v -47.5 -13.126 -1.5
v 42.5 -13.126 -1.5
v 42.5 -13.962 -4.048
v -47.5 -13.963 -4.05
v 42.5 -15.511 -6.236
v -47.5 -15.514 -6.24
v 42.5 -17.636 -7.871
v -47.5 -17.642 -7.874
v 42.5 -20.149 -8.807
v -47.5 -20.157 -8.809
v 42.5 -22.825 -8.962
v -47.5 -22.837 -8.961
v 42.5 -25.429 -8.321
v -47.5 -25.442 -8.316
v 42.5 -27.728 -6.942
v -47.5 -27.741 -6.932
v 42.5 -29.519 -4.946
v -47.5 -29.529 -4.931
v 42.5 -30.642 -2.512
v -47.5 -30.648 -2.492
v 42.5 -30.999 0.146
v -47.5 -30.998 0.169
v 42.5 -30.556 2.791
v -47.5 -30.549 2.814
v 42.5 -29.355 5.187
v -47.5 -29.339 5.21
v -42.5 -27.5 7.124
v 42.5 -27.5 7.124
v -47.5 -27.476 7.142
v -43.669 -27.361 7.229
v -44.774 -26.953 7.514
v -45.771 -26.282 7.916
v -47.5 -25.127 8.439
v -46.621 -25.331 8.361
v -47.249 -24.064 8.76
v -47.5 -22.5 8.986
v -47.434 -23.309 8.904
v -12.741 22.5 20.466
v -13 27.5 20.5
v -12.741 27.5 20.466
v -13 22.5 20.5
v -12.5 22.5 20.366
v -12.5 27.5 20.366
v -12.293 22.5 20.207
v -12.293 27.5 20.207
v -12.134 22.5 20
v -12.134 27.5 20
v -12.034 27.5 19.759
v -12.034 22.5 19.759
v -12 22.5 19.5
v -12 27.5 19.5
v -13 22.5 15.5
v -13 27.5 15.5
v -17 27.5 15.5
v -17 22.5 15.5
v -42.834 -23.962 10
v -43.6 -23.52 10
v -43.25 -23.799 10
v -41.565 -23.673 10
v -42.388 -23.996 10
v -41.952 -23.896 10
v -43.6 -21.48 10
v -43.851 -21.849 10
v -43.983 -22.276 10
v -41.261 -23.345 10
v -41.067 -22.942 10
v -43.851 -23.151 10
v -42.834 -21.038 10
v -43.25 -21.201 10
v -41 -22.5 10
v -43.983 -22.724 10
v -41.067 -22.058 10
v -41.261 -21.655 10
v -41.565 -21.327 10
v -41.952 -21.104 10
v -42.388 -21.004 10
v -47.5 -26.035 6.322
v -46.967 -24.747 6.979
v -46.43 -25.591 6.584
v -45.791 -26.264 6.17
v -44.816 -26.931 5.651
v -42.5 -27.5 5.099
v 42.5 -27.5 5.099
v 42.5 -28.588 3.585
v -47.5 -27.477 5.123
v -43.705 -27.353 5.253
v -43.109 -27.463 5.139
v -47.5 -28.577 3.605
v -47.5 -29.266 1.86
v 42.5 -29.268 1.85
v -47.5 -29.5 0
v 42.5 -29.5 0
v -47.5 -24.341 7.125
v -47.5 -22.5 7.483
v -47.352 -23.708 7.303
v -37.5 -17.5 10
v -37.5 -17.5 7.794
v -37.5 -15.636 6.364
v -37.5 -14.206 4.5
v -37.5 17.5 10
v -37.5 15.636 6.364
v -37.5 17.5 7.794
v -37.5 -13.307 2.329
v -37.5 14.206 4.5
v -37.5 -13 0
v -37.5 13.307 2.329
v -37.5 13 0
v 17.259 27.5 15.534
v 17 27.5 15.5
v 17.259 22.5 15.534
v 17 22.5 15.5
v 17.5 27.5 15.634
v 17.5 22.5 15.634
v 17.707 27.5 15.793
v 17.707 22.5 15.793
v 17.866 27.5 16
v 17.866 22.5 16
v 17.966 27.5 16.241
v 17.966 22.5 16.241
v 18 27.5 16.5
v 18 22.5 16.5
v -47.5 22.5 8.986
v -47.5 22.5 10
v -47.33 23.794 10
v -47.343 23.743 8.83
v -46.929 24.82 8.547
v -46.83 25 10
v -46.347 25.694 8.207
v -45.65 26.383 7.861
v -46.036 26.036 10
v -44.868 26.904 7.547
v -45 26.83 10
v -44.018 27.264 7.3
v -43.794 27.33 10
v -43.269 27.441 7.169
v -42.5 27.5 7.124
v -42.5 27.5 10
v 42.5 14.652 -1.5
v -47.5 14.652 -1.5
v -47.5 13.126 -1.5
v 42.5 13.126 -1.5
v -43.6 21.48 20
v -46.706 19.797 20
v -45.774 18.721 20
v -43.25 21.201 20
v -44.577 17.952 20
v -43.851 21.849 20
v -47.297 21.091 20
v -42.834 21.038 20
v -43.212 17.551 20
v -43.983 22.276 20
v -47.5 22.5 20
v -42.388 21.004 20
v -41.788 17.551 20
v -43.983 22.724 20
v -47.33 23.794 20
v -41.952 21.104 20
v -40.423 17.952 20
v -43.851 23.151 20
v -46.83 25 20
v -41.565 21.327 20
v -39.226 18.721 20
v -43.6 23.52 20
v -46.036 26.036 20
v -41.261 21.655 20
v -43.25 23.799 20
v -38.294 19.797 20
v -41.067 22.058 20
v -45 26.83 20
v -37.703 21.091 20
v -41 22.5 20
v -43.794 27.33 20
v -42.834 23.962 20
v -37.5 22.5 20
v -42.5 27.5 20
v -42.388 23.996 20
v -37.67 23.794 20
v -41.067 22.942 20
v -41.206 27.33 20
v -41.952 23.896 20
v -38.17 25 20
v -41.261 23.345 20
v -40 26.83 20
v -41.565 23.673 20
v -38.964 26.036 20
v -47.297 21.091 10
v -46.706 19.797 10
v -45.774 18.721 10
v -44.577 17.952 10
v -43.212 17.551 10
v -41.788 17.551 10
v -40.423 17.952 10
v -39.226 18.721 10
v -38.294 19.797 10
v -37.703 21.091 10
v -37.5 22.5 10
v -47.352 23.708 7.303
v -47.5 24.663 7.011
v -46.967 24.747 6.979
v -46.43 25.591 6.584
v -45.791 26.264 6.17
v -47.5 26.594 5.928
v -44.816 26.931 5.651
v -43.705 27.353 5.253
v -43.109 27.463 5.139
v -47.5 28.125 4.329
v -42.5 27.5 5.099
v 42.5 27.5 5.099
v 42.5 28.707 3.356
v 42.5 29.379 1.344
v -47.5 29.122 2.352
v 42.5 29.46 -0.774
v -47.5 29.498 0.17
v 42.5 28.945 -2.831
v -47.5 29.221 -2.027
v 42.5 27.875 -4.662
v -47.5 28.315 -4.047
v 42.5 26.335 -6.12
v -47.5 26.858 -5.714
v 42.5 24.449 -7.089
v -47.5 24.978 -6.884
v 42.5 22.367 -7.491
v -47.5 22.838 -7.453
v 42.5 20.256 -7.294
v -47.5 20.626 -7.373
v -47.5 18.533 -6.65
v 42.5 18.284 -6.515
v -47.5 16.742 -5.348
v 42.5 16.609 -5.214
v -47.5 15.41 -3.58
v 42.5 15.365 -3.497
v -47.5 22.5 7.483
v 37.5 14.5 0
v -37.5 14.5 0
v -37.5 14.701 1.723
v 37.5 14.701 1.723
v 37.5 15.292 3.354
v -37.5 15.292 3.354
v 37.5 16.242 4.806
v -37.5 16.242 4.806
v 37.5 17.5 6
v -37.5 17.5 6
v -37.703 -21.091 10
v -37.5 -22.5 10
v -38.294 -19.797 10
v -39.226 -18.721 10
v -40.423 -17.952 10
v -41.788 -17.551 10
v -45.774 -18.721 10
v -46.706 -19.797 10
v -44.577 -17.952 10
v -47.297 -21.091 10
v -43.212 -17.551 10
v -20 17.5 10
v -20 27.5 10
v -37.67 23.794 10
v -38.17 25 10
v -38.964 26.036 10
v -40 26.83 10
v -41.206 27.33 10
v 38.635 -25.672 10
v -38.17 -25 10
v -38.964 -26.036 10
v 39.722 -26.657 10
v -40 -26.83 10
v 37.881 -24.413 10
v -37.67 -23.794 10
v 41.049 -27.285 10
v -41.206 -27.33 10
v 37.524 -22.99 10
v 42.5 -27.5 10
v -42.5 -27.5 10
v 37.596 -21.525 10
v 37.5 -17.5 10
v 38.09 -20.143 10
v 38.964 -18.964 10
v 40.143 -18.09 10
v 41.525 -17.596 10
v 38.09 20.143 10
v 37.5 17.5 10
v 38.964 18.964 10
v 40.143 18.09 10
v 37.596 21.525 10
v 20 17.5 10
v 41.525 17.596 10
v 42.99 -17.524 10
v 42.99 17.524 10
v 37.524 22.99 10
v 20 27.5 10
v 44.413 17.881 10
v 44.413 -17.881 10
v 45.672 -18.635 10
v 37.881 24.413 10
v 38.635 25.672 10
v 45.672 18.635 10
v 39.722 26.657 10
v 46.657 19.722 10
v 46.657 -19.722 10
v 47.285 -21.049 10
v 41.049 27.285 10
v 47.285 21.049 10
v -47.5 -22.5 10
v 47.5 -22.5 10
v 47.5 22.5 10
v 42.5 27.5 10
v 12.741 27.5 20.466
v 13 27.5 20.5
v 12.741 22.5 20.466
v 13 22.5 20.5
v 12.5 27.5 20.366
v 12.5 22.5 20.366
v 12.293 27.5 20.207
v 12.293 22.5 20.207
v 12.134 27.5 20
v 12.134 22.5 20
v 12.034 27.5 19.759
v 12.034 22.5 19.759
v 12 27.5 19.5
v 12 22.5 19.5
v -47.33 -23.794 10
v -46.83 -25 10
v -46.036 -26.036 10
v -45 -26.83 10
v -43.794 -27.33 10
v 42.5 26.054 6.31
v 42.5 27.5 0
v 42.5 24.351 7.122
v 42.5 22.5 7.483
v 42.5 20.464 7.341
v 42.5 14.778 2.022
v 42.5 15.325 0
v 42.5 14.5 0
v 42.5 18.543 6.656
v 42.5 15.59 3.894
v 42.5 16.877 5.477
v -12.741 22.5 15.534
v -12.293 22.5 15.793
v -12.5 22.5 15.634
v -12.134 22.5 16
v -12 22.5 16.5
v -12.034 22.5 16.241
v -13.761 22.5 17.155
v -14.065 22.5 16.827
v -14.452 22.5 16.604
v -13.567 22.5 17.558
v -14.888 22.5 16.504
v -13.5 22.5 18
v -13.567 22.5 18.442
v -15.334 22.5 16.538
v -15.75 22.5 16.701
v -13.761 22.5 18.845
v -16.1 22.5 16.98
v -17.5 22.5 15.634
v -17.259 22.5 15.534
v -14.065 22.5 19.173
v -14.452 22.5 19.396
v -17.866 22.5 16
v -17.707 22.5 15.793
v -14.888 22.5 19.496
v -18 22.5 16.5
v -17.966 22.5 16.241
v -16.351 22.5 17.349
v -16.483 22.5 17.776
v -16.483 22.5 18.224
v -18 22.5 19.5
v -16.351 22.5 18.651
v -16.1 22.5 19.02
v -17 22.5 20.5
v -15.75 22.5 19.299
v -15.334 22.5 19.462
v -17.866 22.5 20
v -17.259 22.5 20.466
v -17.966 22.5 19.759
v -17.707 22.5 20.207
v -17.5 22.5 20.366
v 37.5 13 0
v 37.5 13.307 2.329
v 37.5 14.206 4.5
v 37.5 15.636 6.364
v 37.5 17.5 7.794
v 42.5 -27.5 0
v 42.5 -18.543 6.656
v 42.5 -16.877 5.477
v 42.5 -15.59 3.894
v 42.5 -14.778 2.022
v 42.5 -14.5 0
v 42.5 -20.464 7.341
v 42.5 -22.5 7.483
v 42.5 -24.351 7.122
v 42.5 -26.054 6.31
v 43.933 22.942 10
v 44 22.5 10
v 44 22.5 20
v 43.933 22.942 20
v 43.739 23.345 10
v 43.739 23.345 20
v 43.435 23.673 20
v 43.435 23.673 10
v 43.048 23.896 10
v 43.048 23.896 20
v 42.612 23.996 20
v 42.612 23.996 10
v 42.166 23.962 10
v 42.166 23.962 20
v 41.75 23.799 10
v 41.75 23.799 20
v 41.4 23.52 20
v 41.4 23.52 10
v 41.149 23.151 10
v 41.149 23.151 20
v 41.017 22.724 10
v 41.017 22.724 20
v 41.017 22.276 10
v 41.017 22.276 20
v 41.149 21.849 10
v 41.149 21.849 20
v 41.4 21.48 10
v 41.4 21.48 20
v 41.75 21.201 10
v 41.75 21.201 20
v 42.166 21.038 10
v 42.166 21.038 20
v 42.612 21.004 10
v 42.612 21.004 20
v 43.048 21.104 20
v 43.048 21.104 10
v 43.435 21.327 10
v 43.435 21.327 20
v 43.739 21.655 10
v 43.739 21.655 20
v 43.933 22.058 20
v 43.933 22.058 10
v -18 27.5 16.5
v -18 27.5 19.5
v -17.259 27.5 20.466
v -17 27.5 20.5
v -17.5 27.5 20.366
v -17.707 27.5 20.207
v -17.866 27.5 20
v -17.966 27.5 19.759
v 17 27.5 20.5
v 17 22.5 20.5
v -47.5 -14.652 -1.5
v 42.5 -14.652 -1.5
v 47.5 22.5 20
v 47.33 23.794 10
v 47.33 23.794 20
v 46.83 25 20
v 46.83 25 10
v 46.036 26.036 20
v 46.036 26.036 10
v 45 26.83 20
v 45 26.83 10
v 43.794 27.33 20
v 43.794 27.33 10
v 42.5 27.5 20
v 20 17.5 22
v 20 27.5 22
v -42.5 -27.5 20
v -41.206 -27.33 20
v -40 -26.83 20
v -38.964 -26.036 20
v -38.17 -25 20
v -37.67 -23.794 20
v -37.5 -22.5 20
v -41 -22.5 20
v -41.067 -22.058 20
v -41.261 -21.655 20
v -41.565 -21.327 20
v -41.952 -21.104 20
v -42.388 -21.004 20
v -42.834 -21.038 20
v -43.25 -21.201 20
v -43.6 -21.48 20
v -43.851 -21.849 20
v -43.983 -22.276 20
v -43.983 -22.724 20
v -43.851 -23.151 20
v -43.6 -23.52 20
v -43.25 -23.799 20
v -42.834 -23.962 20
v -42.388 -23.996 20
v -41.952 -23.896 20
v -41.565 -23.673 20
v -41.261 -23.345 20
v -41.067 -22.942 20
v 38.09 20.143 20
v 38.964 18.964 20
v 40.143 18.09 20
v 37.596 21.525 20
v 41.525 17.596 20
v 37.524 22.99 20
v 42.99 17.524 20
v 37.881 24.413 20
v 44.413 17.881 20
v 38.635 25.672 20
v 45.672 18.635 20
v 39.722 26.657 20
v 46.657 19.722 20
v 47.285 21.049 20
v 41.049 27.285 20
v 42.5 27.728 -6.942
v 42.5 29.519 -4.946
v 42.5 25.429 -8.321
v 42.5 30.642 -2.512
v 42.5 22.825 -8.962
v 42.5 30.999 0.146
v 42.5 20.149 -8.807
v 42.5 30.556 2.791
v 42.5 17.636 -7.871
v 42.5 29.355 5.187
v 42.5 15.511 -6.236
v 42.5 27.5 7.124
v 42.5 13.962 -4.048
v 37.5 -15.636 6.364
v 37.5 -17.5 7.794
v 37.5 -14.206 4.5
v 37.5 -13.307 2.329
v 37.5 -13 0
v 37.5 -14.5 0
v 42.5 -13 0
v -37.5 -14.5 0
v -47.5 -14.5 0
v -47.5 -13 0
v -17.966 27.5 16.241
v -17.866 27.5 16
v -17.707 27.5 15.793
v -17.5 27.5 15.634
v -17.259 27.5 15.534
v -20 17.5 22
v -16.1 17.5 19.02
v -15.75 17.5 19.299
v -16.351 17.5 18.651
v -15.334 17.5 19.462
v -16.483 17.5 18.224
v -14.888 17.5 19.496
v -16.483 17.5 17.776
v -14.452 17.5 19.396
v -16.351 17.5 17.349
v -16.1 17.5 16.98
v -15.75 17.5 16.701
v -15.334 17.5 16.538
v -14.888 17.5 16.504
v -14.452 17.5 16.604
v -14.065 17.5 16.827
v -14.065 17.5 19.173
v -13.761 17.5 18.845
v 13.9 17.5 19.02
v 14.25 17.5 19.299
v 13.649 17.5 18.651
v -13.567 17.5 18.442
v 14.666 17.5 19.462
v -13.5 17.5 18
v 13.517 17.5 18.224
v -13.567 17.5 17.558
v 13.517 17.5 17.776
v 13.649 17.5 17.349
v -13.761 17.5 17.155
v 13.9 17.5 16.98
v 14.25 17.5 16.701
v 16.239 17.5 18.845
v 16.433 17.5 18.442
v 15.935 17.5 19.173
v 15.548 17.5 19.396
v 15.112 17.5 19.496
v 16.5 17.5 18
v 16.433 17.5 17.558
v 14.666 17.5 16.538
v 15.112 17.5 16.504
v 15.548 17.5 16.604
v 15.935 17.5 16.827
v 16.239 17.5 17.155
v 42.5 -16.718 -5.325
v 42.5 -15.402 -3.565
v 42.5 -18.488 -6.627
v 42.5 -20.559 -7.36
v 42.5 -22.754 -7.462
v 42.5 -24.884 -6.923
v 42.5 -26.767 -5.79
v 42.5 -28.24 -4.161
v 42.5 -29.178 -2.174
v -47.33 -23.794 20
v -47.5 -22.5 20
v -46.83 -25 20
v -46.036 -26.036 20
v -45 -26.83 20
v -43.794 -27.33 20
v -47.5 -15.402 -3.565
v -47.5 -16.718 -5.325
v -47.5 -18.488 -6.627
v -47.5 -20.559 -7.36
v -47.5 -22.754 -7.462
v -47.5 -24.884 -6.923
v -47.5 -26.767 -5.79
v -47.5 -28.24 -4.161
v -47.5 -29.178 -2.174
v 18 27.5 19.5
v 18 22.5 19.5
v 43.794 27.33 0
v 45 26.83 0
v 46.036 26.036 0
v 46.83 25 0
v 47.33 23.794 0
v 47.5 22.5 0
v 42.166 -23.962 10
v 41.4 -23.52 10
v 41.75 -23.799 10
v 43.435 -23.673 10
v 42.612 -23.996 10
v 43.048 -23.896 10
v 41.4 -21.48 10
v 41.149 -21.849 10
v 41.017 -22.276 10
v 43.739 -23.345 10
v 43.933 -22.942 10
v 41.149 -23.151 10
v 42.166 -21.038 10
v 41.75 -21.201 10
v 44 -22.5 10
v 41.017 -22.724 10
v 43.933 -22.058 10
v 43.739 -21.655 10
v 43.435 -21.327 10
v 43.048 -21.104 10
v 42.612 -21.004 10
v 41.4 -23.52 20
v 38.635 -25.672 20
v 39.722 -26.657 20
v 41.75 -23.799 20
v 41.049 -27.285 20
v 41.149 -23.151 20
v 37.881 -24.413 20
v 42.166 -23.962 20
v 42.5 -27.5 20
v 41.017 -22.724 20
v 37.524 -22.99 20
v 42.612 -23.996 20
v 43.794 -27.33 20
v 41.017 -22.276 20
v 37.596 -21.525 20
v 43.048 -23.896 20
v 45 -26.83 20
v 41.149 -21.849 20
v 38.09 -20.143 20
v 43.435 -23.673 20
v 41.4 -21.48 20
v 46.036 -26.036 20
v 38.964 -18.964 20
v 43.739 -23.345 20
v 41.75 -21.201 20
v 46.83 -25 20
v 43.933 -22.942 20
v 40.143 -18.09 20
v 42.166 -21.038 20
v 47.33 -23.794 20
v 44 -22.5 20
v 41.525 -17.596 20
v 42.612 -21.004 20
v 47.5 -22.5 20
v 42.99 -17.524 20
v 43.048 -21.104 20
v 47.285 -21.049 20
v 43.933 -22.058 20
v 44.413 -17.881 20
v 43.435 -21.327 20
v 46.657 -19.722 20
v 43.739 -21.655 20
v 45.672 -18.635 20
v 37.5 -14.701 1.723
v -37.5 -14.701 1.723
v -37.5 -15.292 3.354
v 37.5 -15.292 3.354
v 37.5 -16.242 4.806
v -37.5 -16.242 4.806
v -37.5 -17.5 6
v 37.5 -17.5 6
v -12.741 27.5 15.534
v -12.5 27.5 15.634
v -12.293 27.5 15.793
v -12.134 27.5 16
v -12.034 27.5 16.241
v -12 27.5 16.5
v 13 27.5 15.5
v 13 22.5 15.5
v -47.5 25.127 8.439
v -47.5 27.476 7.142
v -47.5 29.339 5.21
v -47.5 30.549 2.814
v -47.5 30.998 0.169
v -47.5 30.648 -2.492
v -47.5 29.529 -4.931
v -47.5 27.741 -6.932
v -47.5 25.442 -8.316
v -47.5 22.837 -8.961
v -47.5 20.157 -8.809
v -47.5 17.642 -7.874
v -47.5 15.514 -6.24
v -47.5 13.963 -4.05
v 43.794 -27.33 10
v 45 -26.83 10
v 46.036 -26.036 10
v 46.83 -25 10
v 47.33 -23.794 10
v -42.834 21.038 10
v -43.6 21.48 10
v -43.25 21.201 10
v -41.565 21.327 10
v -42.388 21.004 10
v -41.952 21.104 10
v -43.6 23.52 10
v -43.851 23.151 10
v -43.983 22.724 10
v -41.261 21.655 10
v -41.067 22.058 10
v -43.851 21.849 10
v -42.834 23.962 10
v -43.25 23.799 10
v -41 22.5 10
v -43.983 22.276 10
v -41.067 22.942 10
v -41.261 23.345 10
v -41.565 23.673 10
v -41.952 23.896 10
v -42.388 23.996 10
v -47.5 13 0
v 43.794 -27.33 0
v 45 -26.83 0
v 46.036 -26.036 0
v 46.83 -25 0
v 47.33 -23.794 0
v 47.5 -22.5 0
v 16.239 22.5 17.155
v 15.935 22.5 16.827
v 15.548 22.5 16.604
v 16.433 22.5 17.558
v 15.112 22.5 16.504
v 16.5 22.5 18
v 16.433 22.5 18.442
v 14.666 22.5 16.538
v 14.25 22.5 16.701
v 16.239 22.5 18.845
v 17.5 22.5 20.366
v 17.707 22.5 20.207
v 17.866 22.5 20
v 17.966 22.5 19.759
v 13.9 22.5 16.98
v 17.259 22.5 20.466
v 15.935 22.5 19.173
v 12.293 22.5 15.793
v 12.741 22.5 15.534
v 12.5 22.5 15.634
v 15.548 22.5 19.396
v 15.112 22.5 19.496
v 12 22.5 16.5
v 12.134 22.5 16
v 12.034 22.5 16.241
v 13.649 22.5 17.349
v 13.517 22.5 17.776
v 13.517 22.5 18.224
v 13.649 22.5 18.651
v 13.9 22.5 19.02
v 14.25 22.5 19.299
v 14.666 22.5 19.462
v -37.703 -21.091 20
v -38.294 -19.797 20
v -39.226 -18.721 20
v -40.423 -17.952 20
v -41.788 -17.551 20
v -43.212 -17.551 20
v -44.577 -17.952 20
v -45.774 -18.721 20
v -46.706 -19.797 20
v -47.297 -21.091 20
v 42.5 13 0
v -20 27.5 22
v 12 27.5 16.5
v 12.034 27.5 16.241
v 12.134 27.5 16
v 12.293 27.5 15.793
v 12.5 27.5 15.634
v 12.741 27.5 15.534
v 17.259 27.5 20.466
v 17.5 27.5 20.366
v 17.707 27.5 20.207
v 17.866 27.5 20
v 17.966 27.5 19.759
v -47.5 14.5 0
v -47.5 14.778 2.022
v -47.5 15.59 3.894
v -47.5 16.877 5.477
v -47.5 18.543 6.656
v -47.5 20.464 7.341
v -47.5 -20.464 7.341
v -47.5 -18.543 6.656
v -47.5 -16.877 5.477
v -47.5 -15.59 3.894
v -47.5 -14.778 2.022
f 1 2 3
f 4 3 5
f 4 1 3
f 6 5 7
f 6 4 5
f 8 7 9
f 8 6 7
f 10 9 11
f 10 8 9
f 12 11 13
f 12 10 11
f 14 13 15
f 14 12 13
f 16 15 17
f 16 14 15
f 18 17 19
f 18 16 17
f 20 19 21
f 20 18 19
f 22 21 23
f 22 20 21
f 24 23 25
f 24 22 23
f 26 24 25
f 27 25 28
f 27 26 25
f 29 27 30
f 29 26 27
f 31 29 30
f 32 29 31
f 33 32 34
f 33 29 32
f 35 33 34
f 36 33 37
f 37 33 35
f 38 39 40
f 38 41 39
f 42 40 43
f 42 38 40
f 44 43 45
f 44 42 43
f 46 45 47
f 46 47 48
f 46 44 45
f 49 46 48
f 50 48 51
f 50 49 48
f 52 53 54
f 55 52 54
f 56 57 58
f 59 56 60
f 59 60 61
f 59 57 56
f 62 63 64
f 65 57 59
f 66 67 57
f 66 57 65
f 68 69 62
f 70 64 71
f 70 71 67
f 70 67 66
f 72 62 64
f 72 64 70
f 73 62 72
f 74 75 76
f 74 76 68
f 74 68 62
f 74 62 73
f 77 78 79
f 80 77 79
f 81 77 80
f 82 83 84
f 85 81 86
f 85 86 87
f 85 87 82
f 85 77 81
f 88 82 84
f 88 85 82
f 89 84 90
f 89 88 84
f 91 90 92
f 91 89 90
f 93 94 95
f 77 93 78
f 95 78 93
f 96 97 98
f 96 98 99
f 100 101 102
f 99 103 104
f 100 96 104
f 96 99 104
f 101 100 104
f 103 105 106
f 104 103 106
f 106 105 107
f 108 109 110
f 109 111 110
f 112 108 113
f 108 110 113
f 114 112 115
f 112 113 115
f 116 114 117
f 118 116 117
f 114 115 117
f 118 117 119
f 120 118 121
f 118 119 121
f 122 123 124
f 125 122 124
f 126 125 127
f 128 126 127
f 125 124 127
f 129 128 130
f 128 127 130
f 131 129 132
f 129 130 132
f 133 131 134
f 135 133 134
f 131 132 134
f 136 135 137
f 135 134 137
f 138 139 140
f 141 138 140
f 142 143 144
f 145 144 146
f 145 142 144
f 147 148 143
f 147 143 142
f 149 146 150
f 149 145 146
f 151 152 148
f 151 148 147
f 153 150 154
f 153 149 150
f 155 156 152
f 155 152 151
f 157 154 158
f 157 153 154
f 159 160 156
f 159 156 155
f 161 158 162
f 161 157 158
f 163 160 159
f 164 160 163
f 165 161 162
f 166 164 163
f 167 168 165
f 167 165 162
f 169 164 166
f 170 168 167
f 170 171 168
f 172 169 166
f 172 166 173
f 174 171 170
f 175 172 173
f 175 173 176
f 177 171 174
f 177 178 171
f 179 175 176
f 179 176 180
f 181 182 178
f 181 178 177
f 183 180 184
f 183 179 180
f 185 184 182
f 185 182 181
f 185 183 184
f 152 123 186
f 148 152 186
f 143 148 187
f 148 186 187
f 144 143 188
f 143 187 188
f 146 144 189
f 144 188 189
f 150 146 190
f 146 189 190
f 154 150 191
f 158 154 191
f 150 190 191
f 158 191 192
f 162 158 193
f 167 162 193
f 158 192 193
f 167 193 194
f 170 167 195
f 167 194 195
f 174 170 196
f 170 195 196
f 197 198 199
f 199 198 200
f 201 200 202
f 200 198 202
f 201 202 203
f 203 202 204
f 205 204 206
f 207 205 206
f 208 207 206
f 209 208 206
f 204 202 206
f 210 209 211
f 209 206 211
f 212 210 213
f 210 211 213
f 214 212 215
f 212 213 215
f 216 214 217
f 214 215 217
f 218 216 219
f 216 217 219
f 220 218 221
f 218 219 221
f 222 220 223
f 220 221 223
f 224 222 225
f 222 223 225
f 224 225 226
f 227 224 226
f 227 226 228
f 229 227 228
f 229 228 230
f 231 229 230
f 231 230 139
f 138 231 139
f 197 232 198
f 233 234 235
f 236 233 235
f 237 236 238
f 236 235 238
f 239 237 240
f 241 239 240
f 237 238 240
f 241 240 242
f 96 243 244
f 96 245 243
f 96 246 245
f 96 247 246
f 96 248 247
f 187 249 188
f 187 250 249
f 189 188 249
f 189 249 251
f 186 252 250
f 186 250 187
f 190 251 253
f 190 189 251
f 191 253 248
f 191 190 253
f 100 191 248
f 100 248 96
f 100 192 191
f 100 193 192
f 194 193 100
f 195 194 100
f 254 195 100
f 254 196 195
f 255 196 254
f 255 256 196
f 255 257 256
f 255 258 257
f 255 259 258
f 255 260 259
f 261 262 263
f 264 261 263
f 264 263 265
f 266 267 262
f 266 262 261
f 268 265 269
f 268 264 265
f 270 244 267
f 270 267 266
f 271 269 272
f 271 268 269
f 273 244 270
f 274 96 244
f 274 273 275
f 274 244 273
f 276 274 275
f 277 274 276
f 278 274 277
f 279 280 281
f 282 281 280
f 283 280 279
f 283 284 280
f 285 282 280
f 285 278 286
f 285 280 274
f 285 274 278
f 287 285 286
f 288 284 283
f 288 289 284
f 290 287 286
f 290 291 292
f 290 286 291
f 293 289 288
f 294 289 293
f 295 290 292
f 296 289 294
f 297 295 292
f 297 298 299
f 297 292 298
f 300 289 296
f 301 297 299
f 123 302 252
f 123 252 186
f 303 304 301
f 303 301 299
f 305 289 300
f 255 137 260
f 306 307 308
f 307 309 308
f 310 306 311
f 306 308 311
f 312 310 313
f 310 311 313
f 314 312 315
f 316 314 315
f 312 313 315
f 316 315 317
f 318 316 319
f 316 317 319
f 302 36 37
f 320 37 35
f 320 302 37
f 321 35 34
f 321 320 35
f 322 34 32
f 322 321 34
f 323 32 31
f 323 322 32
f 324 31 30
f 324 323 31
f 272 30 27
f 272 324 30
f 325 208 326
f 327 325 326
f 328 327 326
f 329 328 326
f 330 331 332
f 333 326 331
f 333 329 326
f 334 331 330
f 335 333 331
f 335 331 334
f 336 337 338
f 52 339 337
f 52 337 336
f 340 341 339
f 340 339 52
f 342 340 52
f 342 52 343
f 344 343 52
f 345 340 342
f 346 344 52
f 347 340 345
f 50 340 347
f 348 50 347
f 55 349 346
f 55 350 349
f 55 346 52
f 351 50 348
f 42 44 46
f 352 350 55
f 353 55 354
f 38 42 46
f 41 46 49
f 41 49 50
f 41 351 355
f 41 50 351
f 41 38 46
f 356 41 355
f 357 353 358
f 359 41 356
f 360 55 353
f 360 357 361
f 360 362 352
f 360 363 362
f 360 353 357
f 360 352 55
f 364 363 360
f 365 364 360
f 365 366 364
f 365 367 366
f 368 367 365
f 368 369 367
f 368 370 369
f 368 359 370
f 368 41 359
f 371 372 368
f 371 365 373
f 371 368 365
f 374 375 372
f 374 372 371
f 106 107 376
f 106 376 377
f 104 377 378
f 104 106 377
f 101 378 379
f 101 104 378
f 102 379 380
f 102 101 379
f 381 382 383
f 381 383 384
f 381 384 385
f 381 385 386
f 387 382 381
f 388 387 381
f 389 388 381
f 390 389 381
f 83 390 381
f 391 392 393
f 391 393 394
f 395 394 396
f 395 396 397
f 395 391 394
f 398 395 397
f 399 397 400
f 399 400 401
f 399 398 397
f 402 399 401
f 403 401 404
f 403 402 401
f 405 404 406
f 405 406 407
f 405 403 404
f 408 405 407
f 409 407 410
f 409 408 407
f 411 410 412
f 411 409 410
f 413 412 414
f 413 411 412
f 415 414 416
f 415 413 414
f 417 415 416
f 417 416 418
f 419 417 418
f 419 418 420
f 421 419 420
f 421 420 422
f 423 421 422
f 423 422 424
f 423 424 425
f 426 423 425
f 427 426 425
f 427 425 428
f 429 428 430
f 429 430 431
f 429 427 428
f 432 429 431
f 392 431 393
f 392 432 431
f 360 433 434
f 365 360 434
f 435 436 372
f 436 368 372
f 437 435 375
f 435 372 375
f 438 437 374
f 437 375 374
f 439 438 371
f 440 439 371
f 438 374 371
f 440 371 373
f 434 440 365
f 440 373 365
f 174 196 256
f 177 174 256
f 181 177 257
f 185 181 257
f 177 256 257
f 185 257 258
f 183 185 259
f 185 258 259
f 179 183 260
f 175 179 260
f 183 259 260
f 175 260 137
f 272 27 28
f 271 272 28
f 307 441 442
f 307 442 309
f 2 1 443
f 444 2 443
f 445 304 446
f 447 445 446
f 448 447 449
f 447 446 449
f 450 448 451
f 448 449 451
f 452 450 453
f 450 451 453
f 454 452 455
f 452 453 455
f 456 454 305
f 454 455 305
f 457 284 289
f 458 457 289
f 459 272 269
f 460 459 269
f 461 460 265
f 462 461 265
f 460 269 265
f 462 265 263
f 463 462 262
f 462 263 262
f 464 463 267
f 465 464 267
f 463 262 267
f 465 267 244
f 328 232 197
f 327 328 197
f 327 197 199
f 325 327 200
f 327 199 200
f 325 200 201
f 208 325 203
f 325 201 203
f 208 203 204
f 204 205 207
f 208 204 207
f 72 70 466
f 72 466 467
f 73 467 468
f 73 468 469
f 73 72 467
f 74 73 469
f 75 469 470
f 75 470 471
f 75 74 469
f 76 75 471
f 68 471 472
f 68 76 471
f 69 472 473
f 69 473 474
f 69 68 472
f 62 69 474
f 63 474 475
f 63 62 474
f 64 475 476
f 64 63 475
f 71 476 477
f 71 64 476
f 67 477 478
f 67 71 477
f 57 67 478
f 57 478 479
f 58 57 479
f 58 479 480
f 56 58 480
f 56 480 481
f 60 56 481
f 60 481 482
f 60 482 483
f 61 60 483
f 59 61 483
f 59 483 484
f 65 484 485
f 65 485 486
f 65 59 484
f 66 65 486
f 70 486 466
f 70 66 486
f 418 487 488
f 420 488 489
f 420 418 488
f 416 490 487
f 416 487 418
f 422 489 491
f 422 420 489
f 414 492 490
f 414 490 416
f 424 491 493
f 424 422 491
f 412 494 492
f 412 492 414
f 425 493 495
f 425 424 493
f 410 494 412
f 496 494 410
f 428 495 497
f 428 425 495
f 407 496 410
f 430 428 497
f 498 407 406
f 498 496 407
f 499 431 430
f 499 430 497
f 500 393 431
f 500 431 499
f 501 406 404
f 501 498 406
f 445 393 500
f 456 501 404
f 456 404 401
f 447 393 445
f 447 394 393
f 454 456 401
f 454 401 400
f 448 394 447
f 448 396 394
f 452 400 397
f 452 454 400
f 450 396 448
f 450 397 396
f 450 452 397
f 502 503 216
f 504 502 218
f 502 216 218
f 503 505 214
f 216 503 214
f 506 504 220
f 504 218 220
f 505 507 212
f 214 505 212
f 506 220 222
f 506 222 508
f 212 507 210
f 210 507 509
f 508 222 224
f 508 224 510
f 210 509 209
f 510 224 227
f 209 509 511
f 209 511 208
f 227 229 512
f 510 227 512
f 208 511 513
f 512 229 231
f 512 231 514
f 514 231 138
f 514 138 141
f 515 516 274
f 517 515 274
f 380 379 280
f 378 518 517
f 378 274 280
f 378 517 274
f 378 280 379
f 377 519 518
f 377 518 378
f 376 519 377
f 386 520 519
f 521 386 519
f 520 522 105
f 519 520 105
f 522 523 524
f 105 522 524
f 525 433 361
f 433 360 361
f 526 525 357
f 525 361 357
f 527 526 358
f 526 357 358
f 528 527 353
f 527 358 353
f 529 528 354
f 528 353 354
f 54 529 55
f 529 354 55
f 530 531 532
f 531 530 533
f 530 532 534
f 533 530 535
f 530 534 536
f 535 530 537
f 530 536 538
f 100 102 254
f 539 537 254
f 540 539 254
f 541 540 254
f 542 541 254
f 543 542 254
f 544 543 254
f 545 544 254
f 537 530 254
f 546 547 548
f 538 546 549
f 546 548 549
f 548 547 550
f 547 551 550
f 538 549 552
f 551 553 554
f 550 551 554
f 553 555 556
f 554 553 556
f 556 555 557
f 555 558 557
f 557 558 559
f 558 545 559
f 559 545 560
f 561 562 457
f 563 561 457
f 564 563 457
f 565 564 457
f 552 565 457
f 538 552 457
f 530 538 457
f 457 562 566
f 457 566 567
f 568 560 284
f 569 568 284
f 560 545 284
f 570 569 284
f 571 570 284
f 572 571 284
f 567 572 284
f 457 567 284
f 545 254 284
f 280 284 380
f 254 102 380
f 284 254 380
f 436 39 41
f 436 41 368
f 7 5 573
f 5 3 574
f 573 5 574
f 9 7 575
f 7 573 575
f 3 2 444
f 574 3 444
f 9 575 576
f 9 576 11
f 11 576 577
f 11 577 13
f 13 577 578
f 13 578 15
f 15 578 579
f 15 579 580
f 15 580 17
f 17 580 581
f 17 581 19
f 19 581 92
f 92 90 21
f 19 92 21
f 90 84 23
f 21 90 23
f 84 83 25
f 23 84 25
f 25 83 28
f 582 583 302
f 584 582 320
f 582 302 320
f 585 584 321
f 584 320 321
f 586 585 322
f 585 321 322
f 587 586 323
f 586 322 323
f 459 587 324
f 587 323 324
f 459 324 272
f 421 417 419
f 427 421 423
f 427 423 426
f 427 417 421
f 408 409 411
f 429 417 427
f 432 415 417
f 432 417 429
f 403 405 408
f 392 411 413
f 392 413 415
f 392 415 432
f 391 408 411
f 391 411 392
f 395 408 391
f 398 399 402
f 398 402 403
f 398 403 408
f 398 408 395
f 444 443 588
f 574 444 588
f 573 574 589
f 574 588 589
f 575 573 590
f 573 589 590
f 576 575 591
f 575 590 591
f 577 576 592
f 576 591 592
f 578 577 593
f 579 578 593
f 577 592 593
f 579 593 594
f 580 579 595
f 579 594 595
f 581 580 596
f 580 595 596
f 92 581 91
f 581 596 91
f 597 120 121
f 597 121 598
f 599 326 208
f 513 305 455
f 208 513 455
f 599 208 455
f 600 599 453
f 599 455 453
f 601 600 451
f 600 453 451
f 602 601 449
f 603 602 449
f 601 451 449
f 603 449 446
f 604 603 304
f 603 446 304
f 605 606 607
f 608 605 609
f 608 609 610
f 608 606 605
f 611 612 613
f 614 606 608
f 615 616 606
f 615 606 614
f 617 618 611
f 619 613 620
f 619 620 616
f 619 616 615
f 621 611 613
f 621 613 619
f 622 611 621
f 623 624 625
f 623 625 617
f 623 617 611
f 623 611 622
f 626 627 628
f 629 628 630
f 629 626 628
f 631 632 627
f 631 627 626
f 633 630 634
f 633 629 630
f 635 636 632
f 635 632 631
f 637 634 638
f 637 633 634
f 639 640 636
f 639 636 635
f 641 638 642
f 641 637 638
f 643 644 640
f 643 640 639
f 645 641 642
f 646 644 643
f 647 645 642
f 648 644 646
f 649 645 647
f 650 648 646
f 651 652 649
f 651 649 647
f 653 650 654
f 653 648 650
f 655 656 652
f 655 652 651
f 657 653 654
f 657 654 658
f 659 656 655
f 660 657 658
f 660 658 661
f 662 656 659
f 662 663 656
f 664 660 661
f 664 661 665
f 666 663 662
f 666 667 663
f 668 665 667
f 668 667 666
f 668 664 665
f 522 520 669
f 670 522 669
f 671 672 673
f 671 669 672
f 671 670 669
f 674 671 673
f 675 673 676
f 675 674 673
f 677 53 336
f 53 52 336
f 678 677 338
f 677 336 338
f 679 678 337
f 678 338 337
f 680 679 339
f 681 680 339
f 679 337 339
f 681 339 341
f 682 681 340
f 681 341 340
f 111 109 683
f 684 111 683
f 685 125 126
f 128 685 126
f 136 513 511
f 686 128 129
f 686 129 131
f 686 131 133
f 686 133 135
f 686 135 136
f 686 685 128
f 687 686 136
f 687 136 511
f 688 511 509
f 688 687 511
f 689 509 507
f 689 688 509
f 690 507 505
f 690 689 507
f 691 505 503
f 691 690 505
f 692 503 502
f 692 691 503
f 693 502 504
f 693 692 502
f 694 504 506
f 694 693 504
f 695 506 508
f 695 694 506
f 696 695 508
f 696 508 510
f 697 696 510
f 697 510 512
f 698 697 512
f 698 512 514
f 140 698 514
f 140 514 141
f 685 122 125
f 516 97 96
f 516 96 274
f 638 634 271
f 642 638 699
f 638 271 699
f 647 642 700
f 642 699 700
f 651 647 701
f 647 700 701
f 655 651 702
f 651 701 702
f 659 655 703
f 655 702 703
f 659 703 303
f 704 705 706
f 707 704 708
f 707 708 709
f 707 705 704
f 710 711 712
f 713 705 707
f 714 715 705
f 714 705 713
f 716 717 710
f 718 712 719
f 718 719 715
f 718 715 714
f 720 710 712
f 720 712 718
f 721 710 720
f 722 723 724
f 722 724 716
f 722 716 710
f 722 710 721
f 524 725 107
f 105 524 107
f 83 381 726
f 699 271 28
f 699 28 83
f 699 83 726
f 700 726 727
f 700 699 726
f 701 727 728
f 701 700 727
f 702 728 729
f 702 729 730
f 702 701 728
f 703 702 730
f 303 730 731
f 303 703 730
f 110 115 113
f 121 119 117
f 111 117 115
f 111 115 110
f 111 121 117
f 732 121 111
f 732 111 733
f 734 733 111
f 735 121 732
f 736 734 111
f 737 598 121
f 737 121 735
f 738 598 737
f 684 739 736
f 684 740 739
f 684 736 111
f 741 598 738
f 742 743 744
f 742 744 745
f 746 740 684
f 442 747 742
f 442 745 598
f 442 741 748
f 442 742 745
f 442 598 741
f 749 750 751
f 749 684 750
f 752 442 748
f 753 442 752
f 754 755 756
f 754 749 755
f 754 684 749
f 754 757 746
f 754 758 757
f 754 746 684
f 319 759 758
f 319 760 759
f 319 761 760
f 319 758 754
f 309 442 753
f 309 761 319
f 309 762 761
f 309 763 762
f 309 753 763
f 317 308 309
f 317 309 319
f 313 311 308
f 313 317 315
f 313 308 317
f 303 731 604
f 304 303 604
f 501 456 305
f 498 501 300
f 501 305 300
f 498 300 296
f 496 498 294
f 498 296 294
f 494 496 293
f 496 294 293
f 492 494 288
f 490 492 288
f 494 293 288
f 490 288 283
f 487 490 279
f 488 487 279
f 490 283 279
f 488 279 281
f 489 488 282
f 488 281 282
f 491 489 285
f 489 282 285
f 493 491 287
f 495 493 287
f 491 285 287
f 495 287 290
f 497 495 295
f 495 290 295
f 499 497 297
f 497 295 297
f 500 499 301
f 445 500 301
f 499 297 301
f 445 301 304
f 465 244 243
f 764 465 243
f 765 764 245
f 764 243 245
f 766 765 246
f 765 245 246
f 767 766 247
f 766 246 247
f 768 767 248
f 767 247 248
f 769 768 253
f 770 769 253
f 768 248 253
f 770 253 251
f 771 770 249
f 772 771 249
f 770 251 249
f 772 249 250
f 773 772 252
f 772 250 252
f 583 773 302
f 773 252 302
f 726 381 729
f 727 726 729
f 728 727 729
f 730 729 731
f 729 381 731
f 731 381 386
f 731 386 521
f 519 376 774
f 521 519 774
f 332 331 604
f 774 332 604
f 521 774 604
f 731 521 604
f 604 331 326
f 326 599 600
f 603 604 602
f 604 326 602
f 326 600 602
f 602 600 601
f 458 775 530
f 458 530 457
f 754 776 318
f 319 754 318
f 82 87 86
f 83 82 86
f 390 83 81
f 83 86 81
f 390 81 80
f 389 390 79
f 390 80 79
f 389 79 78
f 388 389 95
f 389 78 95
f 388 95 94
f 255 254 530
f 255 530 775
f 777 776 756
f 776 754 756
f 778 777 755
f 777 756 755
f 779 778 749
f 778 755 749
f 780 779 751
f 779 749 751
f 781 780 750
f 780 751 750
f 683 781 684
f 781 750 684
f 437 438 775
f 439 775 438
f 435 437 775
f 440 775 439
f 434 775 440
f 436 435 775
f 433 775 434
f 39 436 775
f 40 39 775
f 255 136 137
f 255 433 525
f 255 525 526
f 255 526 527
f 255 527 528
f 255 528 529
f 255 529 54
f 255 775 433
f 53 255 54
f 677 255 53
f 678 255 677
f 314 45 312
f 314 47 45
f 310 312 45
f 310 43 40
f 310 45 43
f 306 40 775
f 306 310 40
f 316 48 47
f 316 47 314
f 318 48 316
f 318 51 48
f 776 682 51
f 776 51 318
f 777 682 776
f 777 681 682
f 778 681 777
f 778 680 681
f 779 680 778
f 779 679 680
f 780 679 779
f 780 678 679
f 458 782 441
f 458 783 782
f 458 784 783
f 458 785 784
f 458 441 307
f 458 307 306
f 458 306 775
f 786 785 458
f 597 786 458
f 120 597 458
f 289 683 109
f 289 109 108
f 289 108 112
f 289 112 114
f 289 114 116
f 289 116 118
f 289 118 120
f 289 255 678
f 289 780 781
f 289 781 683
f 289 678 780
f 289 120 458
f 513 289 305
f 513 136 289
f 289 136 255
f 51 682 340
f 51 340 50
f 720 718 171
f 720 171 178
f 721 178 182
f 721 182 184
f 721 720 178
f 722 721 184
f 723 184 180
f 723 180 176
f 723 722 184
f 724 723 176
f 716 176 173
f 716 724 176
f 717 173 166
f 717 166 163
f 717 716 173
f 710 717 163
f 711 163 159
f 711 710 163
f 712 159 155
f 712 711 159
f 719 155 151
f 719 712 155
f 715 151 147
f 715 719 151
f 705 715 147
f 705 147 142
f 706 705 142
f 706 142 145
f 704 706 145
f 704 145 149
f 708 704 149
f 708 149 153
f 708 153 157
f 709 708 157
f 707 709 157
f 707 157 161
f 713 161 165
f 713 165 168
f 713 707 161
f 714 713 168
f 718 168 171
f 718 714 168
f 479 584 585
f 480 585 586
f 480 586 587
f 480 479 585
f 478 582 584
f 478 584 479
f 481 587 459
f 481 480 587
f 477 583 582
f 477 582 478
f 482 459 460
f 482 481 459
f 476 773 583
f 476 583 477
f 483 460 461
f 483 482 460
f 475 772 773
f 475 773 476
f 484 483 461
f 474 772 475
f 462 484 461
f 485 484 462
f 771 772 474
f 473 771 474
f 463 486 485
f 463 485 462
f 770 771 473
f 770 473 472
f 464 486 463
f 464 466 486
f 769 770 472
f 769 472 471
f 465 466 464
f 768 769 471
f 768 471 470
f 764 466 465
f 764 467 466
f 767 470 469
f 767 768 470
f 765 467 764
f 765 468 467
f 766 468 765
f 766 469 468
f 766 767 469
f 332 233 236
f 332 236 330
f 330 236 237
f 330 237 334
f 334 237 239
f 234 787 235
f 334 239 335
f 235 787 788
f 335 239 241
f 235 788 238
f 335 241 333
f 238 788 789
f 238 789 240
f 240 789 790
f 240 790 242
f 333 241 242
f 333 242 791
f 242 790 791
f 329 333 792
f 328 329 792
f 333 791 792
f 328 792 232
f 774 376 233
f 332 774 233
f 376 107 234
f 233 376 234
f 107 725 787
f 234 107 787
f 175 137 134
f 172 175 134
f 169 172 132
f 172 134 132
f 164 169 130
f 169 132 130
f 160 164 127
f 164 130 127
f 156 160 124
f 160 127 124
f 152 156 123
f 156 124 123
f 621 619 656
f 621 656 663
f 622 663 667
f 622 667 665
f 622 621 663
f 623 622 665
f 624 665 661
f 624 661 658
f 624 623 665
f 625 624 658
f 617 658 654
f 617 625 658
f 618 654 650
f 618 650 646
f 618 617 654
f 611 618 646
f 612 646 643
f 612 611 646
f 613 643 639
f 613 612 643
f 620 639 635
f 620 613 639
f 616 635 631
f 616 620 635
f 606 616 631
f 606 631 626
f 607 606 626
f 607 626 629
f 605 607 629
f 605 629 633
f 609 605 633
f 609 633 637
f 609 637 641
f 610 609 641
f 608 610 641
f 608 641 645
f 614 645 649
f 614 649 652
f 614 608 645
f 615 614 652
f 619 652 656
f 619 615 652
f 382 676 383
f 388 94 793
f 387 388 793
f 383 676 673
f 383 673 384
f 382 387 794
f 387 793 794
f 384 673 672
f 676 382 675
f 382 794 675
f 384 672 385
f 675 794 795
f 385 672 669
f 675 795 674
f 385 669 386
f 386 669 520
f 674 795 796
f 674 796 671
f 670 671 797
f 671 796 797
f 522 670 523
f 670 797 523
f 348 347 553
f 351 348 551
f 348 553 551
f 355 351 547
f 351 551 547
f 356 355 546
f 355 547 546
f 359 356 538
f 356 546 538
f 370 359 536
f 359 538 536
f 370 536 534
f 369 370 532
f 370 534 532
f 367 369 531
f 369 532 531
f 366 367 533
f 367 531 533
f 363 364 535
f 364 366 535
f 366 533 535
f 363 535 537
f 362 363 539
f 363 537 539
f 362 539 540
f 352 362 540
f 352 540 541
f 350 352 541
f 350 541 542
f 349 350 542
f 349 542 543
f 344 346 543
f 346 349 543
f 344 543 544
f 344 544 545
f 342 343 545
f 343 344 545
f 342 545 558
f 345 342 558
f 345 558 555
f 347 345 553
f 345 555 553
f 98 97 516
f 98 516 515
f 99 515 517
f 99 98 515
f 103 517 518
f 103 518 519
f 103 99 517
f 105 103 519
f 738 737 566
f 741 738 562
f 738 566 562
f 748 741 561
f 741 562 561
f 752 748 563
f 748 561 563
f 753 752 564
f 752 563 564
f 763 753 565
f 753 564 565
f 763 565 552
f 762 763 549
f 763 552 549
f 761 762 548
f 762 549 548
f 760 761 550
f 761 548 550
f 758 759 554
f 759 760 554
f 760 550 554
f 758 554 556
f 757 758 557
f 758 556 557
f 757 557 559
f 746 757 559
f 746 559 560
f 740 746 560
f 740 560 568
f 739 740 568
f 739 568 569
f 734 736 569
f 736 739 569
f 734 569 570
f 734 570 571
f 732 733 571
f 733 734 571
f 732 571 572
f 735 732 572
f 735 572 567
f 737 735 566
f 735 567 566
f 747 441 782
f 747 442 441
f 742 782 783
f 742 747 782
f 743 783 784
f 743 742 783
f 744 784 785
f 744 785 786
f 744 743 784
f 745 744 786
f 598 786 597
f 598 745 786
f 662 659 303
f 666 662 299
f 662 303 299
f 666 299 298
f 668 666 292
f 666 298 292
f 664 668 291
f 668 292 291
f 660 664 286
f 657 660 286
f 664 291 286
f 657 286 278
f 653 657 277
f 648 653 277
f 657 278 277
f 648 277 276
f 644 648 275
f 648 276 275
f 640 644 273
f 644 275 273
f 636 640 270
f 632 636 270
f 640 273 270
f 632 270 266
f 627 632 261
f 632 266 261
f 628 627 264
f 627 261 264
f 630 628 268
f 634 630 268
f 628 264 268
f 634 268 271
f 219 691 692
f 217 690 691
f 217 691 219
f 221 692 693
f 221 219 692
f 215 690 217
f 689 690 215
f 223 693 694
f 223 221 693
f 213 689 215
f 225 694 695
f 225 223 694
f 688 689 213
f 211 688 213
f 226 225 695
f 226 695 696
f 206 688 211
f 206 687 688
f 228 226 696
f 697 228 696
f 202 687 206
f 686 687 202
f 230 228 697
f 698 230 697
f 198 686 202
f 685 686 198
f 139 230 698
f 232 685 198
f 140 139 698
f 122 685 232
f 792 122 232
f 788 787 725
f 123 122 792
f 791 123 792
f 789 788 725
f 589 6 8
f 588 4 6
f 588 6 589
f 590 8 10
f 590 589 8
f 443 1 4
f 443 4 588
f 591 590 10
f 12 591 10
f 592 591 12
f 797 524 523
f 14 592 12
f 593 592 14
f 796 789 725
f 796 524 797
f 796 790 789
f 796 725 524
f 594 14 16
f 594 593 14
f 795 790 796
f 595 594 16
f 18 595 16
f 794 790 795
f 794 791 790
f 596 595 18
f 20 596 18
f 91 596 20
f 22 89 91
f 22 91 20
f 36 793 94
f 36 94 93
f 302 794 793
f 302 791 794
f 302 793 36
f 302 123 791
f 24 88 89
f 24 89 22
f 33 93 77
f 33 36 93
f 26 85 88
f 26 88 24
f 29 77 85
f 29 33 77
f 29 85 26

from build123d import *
from build123d import SkipClean  # not in build123d's __all__

# Parameters (mm, degrees)
F0_W      = 95
F0_H      = 55
F0_W_2    = 75
F0_H_2    = 35
F1_DEPTH  = 10
F2_R      = 5
F3_W      = 40
F3_H      = 10
F4_DEPTH  = 12
F5_R      = 1.5
F6_DEPTH  = 25
F7_W      = 6
F7_H      = 5
F7_R      = 1.5
F8_DEPTH  = 5
F9_R      = 1
F10_R     = 9
F10_R_2   = 7.5
F11_DEPTH = 90
F13_DEPTH = 90
F14_R     = 1.5
F15_DEPTH = 10


with BuildPart() as f1:
    # F0 (on Top) → F1 (new body)
    with BuildSketch(Plane.XY):
        Rectangle(F0_W, F0_H)
        Rectangle(F0_W_2, F0_H_2, mode=Mode.SUBTRACT)
    extrude(amount=F1_DEPTH)

    # F2
    f2_edges = [f1.edges().sort_by_distance(p)[0] for p in [
        (-47.5, -27.5, 5),
        (47.5, -27.5, 5),
        (47.5, 27.5, 5),
        (-47.5, 27.5, 5),
    ]]
    fillet(f2_edges, radius=F2_R)

    # F3 (on face) → F4 (join)
    with BuildSketch(Plane.XY.offset(10)):
        with Locations((0, 22.5)):
            Rectangle(F3_W, F3_H)
    extrude(amount=F4_DEPTH)

    # F5 (on face) → F6 (cut)
    with BuildSketch(Plane.XZ.offset(-17.5)):
        with Locations((-15, 18)):
            Circle(F5_R)
        with Locations((15, 18)):
            Circle(F5_R)
    extrude(amount=-F6_DEPTH, mode=Mode.SUBTRACT)

    # F7 (on face) → F8 (cut)
    with BuildSketch(Plane(origin=(0, 27.5, 0), x_dir=(-1, 0, 0), z_dir=(0, 1, 0))):
        with Locations((15, 18)):
            Rectangle(F7_W, F7_H)
        with Locations((15, 18)):
            Circle(F7_R, mode=Mode.SUBTRACT)
        with Locations((-15, 18)):
            Rectangle(F7_W, F7_H)
        with Locations((-15, 18)):
            Circle(F7_R, mode=Mode.SUBTRACT)
    extrude(amount=-F8_DEPTH, mode=Mode.SUBTRACT)

    # F9
    f9_edges = [f1.edges().sort_by_distance(p)[0] for p in [
        (18, 25, 20.5),
        (12, 25, 20.5),
        (18, 25, 15.5),
        (12, 25, 15.5),
        (-18, 25, 20.5),
        (-12, 25, 20.5),
        (-12, 25, 15.5),
        (-18, 25, 15.5),
    ]]
    fillet(f9_edges, radius=F9_R)

    # F10 (on face) → F11 (join)
    with BuildSketch(Plane(origin=(-47.5, 0, 0), x_dir=(0, -1, 0), z_dir=(-1, 0, 0))):
        with BuildLine():
            ThreePointArc((31, 0), (22, 9), (13, 0))
            ThreePointArc((13, 0), (22, -9), (31, 0))
        make_face()
        with BuildLine():
            ThreePointArc((29.5, 0), (22, -7.5), (14.5, 0))
            ThreePointArc((14.5, 0), (22, 7.5), (29.5, 0))
        make_face(mode=Mode.SUBTRACT)
        with Locations((-22, 0)):
            Circle(F10_R)
        with Locations((-22, 0)):
            Circle(F10_R_2, mode=Mode.SUBTRACT)
    extrude(amount=-F11_DEPTH)

    # F12 (on face) → F13 (cut)
    with BuildSketch(Plane(origin=(-47.5, 0, 0), x_dir=(0, -1, 0), z_dir=(-1, 0, 0))):
        with BuildLine():
            Line((-15.325489454, 0), (-14.5, 0))
            ThreePointArc((-14.5, 0), (-16.876524617, 5.4772255751), (-22.5, 7.4833147735))
            Line((-22.5, 7.4833147735), (-22.5, 0))
            Line((-22.5, 0), (-15.325489454, 0))
        make_face()
        with BuildLine():
            Line((-14.5, -1.5), (-14.5, 0))
            ThreePointArc((-14.5, 0), (-14.5379788525, -0.753817215), (-14.6515307717, -1.5))
            Line((-14.6515307717, -1.5), (-14.5, -1.5))
        make_face()
        with BuildLine():
            ThreePointArc((22.5, 7.4833147735), (16.876524617, 5.4772255751), (14.5, 0))
            Line((14.5, 0), (15.7362241298, 0))
            Line((15.7362241298, 0), (22.5, 0))
            Line((22.5, 0), (22.5, 7.4833147735))
        make_face()
        with BuildLine():
            ThreePointArc((14.6515307717, -1.5), (14.5379788525, -0.753817215), (14.5, 0))
            Line((14.5, 0), (14.5, -1.5))
            Line((14.5, -1.5), (14.6515307717, -1.5))
        make_face()
        with BuildLine():
            Line((15.7362241298, 0), (14.5, 0))
            ThreePointArc((14.5, 0), (14.5379788525, -0.753817215), (14.6515307717, -1.5))
            Line((14.6515307717, -1.5), (15.7362241298, -1.5))
            Line((15.7362241298, -1.5), (15.7362241298, 0))
        make_face()
        with BuildLine():
            Line((14.5, 0), (13, 0))
            ThreePointArc((13, 0), (13.0315252949, -0.7526363425), (13.1258803254, -1.5))
            Line((13.1258803254, -1.5), (14.5, -1.5))
            Line((14.5, -1.5), (14.5, 0))
        make_face()
        with BuildLine():
            Line((-13, 0), (-14.5, 0))
            Line((-14.5, 0), (-14.5, -1.5))
            Line((-14.5, -1.5), (-13.1258803254, -1.5))
            ThreePointArc((-13.1258803254, -1.5), (-13.0315252949, -0.7526363425), (-13, 0))
        make_face()
        with BuildLine():
            Line((-22.5, 0), (-22.5, 7.4833147735))
            ThreePointArc((-22.5, 7.4833147735), (-27.6480411448, -4.9345345502), (-14.6515307717, -1.5))
            Line((-14.6515307717, -1.5), (-15.325489454, -1.5))
            Line((-15.325489454, -1.5), (-15.325489454, 0))
            Line((-15.325489454, 0), (-22.5, 0))
        make_face()
        with BuildLine():
            ThreePointArc((29.5, 0), (27.4772255751, 5.123475383), (22.5, 7.4833147735))
            Line((22.5, 7.4833147735), (22.5, 0))
            Line((22.5, 0), (15.7362241298, 0))
            Line((15.7362241298, 0), (15.7362241298, -1.5))
            Line((15.7362241298, -1.5), (14.6515307717, -1.5))
            ThreePointArc((14.6515307717, -1.5), (22.753817215, -7.4620211475), (29.5, 0))
        make_face()
    extrude(amount=-F13_DEPTH, mode=Mode.SUBTRACT)

    # F14 (on face) → F15 (join)
    with BuildSketch(Plane.XY.offset(10)):
        with BuildLine():
            ThreePointArc((-42.5, 27.5), (-46.0355339059, 26.0355339059), (-47.5, 22.5))
            ThreePointArc((-47.5, 22.5), (-42.5, 17.5), (-37.5, 22.5))
            ThreePointArc((-37.5, 22.5), (-38.9644660941, 26.0355339059), (-42.5, 27.5))
        make_face()
        with Locations((-42.5, 22.5)):
            Circle(F14_R, mode=Mode.SUBTRACT)
        with BuildLine():
            ThreePointArc((-42.5, -27.5), (-38.9644660941, -26.0355339059), (-37.5, -22.5))
            ThreePointArc((-37.5, -22.5), (-42.5, -17.5), (-47.5, -22.5))
            ThreePointArc((-47.5, -22.5), (-46.0355339059, -26.0355339059), (-42.5, -27.5))
        make_face()
        with Locations((-42.5, -22.5)):
            Circle(F14_R, mode=Mode.SUBTRACT)
        with BuildLine():
            ThreePointArc((47.5, -22.5), (38.9644660941, -18.9644660941), (42.5, -27.5))
            ThreePointArc((42.5, -27.5), (46.0355339059, -26.0355339059), (47.5, -22.5))
        make_face()
        with Locations((42.5, -22.5)):
            Circle(F14_R, mode=Mode.SUBTRACT)
        with BuildLine():
            ThreePointArc((42.5, 27.5), (38.9644660941, 18.9644660941), (47.5, 22.5))
            ThreePointArc((47.5, 22.5), (46.0355339059, 26.0355339059), (42.5, 27.5))
        make_face()
        with Locations((42.5, 22.5)):
            Circle(F14_R, mode=Mode.SUBTRACT)
    with SkipClean():  # cleaning this boolean's faces spoils the solid; the shape is the same uncleaned
        extrude(amount=F15_DEPTH)


solid = f1.part
